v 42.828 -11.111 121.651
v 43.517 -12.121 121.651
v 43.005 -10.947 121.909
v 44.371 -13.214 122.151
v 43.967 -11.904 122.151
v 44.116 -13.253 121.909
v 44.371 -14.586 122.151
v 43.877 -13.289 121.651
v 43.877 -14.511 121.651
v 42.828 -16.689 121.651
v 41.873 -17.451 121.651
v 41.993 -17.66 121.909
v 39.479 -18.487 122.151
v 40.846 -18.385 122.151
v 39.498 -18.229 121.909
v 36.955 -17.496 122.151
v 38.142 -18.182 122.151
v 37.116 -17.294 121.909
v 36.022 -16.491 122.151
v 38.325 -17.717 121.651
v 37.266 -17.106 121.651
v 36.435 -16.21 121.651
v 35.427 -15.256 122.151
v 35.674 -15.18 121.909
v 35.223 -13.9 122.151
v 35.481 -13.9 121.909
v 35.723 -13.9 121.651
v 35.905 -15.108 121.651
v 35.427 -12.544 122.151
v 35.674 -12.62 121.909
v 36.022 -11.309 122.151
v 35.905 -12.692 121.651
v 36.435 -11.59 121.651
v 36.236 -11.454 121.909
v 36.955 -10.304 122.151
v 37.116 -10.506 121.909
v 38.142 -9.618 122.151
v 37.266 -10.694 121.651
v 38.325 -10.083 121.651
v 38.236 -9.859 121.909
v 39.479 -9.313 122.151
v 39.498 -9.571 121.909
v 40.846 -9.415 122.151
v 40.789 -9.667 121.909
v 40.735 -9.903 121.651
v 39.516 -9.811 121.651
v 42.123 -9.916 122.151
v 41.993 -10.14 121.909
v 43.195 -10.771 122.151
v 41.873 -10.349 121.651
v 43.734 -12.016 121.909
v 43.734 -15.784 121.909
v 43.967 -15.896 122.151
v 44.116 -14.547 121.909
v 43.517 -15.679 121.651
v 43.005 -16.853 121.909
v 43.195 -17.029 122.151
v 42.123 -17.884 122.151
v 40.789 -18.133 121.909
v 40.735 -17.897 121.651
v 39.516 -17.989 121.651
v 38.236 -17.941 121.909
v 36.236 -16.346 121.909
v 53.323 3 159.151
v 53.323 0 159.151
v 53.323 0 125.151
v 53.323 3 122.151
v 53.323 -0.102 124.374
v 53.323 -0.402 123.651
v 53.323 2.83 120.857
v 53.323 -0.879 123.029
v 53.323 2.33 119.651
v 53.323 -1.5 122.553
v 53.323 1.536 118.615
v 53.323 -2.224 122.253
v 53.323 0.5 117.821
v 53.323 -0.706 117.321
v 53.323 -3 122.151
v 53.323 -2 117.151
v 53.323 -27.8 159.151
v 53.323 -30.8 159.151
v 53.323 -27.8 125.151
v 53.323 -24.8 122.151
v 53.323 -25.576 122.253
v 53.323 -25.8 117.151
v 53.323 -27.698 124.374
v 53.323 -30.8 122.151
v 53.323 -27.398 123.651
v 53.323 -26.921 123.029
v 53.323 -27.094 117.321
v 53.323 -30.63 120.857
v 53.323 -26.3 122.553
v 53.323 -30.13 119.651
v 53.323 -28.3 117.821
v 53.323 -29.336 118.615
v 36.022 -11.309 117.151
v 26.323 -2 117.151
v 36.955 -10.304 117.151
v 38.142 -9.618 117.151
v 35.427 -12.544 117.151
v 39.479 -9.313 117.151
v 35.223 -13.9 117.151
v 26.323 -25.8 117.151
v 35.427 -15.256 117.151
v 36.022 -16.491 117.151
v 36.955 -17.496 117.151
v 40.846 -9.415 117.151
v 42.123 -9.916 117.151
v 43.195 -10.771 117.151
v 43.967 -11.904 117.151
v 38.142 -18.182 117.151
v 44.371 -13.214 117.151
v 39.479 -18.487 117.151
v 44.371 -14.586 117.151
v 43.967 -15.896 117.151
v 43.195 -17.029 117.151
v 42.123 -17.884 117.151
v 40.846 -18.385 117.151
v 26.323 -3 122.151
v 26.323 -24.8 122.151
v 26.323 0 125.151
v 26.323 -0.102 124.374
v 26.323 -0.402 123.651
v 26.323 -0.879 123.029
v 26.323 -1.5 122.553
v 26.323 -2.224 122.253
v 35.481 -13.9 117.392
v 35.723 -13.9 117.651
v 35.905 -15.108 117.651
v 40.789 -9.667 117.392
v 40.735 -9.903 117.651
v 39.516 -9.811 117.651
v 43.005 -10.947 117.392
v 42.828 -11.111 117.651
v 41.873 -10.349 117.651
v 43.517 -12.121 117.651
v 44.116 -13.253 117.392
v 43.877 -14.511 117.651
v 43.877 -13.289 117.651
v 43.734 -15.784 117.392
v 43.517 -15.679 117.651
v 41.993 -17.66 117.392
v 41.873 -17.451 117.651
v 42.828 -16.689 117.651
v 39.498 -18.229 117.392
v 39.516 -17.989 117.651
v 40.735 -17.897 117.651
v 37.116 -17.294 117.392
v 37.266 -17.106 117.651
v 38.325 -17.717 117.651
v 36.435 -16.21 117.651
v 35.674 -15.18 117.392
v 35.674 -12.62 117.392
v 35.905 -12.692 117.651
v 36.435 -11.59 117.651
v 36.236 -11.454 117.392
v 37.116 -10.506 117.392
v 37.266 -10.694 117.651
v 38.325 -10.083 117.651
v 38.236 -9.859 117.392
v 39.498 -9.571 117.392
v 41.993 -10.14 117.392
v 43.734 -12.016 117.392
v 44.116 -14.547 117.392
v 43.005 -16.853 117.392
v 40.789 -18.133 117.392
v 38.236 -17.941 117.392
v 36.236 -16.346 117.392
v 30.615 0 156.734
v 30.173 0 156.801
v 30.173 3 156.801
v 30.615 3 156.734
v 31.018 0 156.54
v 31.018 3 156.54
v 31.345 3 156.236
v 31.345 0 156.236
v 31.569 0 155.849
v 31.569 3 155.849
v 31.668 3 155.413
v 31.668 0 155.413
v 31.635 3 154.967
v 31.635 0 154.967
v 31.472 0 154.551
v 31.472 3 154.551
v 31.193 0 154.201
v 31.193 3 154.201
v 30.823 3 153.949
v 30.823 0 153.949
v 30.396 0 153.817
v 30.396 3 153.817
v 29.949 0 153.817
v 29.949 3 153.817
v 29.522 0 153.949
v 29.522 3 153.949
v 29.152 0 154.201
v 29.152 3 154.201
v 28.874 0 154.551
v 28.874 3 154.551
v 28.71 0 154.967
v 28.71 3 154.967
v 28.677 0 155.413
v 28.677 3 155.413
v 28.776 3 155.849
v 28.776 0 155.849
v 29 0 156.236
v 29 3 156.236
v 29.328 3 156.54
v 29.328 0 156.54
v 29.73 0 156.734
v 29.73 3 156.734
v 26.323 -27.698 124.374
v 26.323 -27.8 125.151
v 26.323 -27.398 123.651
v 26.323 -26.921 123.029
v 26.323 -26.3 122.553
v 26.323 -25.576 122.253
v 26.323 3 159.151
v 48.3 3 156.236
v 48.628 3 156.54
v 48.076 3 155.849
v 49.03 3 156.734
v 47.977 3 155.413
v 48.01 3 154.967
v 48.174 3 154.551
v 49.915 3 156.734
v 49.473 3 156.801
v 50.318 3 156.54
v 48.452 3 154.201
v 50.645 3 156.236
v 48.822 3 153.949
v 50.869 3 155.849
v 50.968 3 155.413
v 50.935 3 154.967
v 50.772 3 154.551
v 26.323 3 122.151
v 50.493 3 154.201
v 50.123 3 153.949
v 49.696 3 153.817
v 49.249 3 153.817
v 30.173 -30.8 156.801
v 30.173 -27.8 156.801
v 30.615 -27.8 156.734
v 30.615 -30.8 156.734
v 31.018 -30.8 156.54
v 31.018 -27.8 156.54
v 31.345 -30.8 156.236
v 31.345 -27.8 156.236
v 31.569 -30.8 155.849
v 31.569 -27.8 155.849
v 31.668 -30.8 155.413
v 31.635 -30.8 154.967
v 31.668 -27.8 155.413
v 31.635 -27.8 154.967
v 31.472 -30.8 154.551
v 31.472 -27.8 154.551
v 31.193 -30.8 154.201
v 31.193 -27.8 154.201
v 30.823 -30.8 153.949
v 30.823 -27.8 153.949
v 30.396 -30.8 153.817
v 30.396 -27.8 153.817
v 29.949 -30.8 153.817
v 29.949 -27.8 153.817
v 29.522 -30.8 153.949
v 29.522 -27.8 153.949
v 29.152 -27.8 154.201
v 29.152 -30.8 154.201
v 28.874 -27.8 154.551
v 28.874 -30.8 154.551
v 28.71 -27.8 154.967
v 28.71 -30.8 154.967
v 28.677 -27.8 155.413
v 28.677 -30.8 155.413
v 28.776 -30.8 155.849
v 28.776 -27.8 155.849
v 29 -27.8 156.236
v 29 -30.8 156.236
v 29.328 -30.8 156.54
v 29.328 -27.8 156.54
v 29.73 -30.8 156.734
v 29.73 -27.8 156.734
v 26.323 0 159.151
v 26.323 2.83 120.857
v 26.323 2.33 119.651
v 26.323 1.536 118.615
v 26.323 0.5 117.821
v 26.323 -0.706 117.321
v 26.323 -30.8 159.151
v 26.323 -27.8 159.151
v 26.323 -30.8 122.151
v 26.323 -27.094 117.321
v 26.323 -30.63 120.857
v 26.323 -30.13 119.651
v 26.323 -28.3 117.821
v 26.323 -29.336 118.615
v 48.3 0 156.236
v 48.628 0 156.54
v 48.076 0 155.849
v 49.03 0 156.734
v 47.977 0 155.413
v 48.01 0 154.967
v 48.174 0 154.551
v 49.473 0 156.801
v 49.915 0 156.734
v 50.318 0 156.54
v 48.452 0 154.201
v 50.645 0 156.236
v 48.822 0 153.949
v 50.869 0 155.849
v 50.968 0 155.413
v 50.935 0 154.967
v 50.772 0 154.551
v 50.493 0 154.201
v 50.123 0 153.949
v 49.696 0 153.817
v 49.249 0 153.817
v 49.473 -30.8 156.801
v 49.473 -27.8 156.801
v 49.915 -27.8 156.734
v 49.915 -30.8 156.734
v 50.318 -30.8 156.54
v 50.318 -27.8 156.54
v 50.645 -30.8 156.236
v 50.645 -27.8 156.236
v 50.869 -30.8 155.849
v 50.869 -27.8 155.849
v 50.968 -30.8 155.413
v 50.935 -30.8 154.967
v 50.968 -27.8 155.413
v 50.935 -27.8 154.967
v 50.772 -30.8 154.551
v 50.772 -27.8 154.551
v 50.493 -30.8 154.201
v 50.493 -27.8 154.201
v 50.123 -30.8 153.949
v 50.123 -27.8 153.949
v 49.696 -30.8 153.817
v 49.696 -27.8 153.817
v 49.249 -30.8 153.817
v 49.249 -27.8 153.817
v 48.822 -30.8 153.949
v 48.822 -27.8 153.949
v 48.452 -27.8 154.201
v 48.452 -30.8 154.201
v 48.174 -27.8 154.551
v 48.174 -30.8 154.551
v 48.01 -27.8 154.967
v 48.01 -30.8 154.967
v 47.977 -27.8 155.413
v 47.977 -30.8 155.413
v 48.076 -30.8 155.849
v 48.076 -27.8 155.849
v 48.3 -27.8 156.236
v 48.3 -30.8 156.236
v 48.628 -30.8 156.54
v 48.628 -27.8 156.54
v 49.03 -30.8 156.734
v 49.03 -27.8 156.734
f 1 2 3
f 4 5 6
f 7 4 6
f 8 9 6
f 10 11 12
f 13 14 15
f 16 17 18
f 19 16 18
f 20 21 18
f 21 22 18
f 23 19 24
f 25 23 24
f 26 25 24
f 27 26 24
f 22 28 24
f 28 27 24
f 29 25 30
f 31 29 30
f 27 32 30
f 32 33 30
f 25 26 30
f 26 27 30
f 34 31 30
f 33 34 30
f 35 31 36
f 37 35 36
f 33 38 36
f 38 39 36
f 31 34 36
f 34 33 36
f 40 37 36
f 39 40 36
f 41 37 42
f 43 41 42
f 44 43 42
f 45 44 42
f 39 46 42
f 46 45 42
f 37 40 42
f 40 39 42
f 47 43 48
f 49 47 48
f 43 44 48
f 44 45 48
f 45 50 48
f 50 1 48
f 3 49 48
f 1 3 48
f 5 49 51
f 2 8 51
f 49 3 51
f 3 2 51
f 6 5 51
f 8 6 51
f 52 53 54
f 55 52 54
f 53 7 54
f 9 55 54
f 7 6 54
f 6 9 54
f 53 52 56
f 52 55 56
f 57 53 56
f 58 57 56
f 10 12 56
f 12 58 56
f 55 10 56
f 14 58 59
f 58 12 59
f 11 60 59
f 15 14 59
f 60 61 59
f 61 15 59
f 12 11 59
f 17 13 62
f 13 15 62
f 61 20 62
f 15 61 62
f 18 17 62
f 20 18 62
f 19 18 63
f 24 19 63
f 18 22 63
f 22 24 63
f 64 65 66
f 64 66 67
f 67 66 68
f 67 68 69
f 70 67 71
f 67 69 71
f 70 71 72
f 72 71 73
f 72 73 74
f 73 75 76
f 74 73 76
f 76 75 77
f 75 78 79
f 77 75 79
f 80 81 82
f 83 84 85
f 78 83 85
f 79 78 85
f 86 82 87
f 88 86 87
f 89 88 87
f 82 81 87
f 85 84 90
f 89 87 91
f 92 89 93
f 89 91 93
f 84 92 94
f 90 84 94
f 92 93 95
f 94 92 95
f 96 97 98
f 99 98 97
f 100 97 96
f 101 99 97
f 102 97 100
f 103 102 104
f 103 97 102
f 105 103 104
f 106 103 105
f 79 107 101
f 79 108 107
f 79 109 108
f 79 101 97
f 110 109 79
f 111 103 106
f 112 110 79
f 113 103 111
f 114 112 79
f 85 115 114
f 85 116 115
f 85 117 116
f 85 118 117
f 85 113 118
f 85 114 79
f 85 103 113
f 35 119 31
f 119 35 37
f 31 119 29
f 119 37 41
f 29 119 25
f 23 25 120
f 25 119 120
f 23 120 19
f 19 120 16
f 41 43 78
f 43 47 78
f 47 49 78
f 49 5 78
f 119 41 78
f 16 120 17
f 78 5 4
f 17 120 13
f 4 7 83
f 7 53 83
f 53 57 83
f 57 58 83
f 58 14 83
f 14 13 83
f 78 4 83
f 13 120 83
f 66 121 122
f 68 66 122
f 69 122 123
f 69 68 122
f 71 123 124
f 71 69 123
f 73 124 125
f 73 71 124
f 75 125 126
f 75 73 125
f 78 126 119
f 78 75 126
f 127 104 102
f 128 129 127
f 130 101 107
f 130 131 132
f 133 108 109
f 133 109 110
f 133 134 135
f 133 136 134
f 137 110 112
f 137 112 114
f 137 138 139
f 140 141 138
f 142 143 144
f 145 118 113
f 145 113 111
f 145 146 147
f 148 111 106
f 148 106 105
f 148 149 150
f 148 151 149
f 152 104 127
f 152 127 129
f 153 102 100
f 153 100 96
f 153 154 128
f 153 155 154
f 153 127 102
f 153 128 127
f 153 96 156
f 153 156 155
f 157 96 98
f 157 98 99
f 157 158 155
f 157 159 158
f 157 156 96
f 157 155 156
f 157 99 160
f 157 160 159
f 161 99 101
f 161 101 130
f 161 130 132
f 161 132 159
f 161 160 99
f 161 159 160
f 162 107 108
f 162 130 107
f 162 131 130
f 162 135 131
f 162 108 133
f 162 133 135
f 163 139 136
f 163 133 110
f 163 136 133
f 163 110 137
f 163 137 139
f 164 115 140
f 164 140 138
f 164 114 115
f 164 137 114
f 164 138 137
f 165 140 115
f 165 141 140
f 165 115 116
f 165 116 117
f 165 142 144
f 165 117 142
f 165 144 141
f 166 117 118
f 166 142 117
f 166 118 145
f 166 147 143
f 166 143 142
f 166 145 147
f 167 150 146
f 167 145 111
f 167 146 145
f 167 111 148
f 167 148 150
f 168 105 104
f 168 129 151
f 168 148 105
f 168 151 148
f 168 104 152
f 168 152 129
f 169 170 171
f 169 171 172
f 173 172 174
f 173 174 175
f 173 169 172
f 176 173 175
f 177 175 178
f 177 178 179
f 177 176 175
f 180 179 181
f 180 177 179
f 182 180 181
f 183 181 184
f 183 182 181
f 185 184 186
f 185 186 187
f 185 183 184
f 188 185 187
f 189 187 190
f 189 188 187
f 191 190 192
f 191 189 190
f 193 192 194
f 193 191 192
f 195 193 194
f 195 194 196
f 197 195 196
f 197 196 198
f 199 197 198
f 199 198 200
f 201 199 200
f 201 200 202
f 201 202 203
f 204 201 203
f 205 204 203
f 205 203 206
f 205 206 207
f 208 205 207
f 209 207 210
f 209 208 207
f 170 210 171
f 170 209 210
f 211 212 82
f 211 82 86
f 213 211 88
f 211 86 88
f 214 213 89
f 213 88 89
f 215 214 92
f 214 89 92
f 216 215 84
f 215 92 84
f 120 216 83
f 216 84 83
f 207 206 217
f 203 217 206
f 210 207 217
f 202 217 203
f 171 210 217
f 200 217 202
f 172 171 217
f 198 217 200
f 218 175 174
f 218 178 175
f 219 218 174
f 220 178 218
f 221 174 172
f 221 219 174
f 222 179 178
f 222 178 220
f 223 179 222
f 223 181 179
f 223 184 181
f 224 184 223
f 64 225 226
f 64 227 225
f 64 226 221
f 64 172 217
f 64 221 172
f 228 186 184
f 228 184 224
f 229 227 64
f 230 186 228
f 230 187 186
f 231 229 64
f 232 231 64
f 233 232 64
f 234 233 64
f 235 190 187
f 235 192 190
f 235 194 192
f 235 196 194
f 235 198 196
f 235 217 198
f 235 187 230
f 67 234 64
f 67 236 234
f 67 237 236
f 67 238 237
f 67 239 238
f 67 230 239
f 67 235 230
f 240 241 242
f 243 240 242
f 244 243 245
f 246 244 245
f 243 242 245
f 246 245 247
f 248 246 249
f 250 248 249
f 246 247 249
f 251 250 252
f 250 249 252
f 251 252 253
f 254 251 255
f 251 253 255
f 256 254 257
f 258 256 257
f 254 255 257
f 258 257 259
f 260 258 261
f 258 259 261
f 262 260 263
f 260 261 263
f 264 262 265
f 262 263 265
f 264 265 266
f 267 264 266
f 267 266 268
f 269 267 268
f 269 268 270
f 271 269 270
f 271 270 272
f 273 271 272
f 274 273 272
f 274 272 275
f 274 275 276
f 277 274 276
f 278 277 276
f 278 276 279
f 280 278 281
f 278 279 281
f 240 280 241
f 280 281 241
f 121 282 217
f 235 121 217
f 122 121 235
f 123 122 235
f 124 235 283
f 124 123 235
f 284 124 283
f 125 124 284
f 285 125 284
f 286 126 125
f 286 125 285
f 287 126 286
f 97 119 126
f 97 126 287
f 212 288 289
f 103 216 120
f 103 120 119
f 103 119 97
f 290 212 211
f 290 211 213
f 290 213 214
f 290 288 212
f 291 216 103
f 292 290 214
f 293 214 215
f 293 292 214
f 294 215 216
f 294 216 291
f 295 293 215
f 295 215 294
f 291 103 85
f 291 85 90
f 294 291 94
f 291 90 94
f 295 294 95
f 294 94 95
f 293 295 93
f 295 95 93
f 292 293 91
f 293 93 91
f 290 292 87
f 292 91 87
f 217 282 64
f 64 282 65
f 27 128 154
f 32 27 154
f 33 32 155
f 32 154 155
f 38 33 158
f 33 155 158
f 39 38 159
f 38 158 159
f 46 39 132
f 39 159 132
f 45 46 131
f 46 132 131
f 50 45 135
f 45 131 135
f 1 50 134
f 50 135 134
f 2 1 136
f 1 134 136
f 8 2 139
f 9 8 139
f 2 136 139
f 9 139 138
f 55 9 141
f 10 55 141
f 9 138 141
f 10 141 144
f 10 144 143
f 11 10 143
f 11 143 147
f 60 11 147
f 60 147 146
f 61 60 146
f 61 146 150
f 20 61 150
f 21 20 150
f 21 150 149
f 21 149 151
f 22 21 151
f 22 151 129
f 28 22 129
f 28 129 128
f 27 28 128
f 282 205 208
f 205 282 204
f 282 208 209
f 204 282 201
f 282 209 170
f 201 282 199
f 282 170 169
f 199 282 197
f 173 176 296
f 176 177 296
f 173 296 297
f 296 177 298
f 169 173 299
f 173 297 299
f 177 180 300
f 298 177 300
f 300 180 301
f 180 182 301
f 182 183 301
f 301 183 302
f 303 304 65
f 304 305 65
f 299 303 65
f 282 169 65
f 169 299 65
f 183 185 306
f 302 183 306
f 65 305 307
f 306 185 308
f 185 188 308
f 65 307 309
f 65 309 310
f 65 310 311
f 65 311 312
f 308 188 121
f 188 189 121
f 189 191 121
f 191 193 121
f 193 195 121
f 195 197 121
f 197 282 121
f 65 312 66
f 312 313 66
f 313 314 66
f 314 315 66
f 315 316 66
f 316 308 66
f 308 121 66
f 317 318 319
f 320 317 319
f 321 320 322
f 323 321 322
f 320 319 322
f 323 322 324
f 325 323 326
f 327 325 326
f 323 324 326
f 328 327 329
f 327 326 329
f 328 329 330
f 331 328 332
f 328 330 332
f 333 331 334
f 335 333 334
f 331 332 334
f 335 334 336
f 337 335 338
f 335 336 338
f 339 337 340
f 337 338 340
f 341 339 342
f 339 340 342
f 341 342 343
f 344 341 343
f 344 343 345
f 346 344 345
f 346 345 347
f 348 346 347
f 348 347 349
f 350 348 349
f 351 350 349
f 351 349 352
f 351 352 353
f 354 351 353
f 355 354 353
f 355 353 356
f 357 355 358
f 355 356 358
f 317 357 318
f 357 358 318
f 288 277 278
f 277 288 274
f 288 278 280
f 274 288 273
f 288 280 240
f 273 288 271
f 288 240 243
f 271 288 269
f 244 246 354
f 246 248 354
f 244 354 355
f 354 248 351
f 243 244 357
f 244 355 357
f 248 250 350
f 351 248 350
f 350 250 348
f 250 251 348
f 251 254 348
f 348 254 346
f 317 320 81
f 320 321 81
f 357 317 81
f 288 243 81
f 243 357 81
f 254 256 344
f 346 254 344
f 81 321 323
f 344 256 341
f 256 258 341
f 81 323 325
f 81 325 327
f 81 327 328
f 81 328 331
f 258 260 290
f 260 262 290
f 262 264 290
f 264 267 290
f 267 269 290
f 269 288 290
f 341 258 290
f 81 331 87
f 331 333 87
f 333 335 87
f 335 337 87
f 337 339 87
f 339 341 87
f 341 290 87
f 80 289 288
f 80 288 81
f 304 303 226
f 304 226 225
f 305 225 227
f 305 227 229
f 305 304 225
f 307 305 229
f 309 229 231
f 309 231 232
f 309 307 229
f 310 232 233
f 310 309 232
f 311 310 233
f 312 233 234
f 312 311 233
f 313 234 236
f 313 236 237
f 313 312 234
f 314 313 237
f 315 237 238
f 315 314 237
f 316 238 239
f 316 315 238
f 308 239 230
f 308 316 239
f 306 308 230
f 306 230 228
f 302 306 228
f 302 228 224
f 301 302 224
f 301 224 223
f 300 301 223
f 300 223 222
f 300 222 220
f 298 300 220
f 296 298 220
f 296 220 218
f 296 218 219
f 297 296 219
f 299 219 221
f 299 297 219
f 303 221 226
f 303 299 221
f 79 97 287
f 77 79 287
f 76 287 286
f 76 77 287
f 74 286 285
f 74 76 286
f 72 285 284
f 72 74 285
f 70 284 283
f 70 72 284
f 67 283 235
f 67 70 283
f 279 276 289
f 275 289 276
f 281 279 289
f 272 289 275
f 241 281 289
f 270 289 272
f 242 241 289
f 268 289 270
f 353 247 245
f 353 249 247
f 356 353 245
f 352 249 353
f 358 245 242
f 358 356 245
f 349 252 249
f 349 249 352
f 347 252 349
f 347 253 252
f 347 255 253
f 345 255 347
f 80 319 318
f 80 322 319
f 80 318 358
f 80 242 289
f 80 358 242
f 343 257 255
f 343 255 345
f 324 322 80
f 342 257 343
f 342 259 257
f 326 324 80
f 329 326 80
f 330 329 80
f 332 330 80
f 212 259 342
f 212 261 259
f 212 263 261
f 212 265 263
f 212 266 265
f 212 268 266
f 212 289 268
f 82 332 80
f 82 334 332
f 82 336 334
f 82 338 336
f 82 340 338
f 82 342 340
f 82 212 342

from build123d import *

# Parameters (mm, degrees)
SKETCH1_W           = 27
SKETCH1_H           = 42
SKETCH1_R           = 1.5
BOSS_EXTRUDE1_DEPTH = 3
SKETCH1_3_W         = 27
SKETCH1_3_H         = 5
BOSS_EXTRUDE2_DEPTH = 13.9
FILLET1_R           = 3
FILLET2_R           = 5
SKETCH3_R           = 4.1
CUT_EXTRUDE1_DEPTH  = 13.9
FILLET3_SIZE        = 0.5


with BuildPart() as part:
    # Sketch1 → Boss-Extrude1 (new body)
    with BuildSketch(Plane(origin=(0, 0, 0), x_dir=(1, 0, 0), z_dir=(0, 1, 0))):
        with Locations((39.822610006, -138.150649163)):
            Rectangle(SKETCH1_W, SKETCH1_H)
        with Locations(Location((49.472610006, -155.300649163, 0), (0, 0, 270))):
            Circle(SKETCH1_R, mode=Mode.SUBTRACT)
        with Locations(Location((30.172610006, -155.300649163, 0), (0, 0, 270))):
            Circle(SKETCH1_R, mode=Mode.SUBTRACT)
    extrude(amount=BOSS_EXTRUDE1_DEPTH)

    # Sketch1<3> → Boss-Extrude2 (add)
    with BuildSketch(Plane(origin=(0, 0, 0), x_dir=(1, 0, 0), z_dir=(0, 1, 0))):
        with Locations((39.822610006, -119.650649163)):
            Rectangle(SKETCH1_3_W, SKETCH1_3_H)
    extrude(amount=-BOSS_EXTRUDE2_DEPTH)

    # Fillet1
    fillet1_edges = [part.edges().sort_by_distance(p)[0] for p in [
        (39.822610006, 0, 122.150649163),
    ]]
    fillet(fillet1_edges, radius=FILLET1_R)

    # Fillet2
    fillet2_edges = [part.edges().sort_by_distance(p)[0] for p in [
        (39.822610006, 3, 117.150649163),
    ]]
    fillet(fillet2_edges, radius=FILLET2_R)

    # Mirror7: part across plane


with BuildPart() as part_1:
    add(part.part)
    add(part.part.mirror(Plane.ZX.offset(-13.9)))

    # Sketch3 → Cut-Extrude1 (cut)
    with BuildSketch(Plane(origin=(0, 0, 117.150649163), x_dir=(-1, 0, 0), z_dir=(0, 0, -1))):
        with Locations((-39.822610006, -13.9)):
            Circle(SKETCH3_R)
    extrude(amount=-CUT_EXTRUDE1_DEPTH, mode=Mode.SUBTRACT)

    # Fillet3
    # a fillet whose section is not a circle: 0.5 mm, written as the material it takes off along each edge
    with BuildSketch(Plane(origin=(39.822610006, -13.9, 122.150649163), x_dir=(-1, 0, 0), z_dir=(0, -1, 0))) as fillet3_piece_1:
        with BuildLine():
            Bezier((4.1 + FILLET3_SIZE, 0), (4.1, 0), (4.1, FILLET3_SIZE), weights=[1, 0.035355339, 1])
            Line((4.1, FILLET3_SIZE), (4.1, 0))
            Line((4.1, 0), (4.1 + FILLET3_SIZE, 0))
        make_face()
    revolve(axis=Axis((39.822610006, -13.9, 122.150649163), (0, 0, -1)), mode=Mode.SUBTRACT)
    with BuildSketch(Plane(origin=(39.822610006, -13.9, 117.150649163), x_dir=(-1, 0, 0), z_dir=(0, -1, 0))) as fillet3_piece_2:
        with BuildLine():
            Bezier((4.1 + FILLET3_SIZE, 0), (4.1, 0), (4.1, -FILLET3_SIZE), weights=[1, 0.035355339, 1])
            Line((4.1, -FILLET3_SIZE), (4.1, 0))
            Line((4.1, 0), (4.1 + FILLET3_SIZE, 0))
        make_face()
    revolve(axis=Axis((39.822610006, -13.9, 117.150649163), (0, 0, -1)), mode=Mode.SUBTRACT)


solid = part_1.part
